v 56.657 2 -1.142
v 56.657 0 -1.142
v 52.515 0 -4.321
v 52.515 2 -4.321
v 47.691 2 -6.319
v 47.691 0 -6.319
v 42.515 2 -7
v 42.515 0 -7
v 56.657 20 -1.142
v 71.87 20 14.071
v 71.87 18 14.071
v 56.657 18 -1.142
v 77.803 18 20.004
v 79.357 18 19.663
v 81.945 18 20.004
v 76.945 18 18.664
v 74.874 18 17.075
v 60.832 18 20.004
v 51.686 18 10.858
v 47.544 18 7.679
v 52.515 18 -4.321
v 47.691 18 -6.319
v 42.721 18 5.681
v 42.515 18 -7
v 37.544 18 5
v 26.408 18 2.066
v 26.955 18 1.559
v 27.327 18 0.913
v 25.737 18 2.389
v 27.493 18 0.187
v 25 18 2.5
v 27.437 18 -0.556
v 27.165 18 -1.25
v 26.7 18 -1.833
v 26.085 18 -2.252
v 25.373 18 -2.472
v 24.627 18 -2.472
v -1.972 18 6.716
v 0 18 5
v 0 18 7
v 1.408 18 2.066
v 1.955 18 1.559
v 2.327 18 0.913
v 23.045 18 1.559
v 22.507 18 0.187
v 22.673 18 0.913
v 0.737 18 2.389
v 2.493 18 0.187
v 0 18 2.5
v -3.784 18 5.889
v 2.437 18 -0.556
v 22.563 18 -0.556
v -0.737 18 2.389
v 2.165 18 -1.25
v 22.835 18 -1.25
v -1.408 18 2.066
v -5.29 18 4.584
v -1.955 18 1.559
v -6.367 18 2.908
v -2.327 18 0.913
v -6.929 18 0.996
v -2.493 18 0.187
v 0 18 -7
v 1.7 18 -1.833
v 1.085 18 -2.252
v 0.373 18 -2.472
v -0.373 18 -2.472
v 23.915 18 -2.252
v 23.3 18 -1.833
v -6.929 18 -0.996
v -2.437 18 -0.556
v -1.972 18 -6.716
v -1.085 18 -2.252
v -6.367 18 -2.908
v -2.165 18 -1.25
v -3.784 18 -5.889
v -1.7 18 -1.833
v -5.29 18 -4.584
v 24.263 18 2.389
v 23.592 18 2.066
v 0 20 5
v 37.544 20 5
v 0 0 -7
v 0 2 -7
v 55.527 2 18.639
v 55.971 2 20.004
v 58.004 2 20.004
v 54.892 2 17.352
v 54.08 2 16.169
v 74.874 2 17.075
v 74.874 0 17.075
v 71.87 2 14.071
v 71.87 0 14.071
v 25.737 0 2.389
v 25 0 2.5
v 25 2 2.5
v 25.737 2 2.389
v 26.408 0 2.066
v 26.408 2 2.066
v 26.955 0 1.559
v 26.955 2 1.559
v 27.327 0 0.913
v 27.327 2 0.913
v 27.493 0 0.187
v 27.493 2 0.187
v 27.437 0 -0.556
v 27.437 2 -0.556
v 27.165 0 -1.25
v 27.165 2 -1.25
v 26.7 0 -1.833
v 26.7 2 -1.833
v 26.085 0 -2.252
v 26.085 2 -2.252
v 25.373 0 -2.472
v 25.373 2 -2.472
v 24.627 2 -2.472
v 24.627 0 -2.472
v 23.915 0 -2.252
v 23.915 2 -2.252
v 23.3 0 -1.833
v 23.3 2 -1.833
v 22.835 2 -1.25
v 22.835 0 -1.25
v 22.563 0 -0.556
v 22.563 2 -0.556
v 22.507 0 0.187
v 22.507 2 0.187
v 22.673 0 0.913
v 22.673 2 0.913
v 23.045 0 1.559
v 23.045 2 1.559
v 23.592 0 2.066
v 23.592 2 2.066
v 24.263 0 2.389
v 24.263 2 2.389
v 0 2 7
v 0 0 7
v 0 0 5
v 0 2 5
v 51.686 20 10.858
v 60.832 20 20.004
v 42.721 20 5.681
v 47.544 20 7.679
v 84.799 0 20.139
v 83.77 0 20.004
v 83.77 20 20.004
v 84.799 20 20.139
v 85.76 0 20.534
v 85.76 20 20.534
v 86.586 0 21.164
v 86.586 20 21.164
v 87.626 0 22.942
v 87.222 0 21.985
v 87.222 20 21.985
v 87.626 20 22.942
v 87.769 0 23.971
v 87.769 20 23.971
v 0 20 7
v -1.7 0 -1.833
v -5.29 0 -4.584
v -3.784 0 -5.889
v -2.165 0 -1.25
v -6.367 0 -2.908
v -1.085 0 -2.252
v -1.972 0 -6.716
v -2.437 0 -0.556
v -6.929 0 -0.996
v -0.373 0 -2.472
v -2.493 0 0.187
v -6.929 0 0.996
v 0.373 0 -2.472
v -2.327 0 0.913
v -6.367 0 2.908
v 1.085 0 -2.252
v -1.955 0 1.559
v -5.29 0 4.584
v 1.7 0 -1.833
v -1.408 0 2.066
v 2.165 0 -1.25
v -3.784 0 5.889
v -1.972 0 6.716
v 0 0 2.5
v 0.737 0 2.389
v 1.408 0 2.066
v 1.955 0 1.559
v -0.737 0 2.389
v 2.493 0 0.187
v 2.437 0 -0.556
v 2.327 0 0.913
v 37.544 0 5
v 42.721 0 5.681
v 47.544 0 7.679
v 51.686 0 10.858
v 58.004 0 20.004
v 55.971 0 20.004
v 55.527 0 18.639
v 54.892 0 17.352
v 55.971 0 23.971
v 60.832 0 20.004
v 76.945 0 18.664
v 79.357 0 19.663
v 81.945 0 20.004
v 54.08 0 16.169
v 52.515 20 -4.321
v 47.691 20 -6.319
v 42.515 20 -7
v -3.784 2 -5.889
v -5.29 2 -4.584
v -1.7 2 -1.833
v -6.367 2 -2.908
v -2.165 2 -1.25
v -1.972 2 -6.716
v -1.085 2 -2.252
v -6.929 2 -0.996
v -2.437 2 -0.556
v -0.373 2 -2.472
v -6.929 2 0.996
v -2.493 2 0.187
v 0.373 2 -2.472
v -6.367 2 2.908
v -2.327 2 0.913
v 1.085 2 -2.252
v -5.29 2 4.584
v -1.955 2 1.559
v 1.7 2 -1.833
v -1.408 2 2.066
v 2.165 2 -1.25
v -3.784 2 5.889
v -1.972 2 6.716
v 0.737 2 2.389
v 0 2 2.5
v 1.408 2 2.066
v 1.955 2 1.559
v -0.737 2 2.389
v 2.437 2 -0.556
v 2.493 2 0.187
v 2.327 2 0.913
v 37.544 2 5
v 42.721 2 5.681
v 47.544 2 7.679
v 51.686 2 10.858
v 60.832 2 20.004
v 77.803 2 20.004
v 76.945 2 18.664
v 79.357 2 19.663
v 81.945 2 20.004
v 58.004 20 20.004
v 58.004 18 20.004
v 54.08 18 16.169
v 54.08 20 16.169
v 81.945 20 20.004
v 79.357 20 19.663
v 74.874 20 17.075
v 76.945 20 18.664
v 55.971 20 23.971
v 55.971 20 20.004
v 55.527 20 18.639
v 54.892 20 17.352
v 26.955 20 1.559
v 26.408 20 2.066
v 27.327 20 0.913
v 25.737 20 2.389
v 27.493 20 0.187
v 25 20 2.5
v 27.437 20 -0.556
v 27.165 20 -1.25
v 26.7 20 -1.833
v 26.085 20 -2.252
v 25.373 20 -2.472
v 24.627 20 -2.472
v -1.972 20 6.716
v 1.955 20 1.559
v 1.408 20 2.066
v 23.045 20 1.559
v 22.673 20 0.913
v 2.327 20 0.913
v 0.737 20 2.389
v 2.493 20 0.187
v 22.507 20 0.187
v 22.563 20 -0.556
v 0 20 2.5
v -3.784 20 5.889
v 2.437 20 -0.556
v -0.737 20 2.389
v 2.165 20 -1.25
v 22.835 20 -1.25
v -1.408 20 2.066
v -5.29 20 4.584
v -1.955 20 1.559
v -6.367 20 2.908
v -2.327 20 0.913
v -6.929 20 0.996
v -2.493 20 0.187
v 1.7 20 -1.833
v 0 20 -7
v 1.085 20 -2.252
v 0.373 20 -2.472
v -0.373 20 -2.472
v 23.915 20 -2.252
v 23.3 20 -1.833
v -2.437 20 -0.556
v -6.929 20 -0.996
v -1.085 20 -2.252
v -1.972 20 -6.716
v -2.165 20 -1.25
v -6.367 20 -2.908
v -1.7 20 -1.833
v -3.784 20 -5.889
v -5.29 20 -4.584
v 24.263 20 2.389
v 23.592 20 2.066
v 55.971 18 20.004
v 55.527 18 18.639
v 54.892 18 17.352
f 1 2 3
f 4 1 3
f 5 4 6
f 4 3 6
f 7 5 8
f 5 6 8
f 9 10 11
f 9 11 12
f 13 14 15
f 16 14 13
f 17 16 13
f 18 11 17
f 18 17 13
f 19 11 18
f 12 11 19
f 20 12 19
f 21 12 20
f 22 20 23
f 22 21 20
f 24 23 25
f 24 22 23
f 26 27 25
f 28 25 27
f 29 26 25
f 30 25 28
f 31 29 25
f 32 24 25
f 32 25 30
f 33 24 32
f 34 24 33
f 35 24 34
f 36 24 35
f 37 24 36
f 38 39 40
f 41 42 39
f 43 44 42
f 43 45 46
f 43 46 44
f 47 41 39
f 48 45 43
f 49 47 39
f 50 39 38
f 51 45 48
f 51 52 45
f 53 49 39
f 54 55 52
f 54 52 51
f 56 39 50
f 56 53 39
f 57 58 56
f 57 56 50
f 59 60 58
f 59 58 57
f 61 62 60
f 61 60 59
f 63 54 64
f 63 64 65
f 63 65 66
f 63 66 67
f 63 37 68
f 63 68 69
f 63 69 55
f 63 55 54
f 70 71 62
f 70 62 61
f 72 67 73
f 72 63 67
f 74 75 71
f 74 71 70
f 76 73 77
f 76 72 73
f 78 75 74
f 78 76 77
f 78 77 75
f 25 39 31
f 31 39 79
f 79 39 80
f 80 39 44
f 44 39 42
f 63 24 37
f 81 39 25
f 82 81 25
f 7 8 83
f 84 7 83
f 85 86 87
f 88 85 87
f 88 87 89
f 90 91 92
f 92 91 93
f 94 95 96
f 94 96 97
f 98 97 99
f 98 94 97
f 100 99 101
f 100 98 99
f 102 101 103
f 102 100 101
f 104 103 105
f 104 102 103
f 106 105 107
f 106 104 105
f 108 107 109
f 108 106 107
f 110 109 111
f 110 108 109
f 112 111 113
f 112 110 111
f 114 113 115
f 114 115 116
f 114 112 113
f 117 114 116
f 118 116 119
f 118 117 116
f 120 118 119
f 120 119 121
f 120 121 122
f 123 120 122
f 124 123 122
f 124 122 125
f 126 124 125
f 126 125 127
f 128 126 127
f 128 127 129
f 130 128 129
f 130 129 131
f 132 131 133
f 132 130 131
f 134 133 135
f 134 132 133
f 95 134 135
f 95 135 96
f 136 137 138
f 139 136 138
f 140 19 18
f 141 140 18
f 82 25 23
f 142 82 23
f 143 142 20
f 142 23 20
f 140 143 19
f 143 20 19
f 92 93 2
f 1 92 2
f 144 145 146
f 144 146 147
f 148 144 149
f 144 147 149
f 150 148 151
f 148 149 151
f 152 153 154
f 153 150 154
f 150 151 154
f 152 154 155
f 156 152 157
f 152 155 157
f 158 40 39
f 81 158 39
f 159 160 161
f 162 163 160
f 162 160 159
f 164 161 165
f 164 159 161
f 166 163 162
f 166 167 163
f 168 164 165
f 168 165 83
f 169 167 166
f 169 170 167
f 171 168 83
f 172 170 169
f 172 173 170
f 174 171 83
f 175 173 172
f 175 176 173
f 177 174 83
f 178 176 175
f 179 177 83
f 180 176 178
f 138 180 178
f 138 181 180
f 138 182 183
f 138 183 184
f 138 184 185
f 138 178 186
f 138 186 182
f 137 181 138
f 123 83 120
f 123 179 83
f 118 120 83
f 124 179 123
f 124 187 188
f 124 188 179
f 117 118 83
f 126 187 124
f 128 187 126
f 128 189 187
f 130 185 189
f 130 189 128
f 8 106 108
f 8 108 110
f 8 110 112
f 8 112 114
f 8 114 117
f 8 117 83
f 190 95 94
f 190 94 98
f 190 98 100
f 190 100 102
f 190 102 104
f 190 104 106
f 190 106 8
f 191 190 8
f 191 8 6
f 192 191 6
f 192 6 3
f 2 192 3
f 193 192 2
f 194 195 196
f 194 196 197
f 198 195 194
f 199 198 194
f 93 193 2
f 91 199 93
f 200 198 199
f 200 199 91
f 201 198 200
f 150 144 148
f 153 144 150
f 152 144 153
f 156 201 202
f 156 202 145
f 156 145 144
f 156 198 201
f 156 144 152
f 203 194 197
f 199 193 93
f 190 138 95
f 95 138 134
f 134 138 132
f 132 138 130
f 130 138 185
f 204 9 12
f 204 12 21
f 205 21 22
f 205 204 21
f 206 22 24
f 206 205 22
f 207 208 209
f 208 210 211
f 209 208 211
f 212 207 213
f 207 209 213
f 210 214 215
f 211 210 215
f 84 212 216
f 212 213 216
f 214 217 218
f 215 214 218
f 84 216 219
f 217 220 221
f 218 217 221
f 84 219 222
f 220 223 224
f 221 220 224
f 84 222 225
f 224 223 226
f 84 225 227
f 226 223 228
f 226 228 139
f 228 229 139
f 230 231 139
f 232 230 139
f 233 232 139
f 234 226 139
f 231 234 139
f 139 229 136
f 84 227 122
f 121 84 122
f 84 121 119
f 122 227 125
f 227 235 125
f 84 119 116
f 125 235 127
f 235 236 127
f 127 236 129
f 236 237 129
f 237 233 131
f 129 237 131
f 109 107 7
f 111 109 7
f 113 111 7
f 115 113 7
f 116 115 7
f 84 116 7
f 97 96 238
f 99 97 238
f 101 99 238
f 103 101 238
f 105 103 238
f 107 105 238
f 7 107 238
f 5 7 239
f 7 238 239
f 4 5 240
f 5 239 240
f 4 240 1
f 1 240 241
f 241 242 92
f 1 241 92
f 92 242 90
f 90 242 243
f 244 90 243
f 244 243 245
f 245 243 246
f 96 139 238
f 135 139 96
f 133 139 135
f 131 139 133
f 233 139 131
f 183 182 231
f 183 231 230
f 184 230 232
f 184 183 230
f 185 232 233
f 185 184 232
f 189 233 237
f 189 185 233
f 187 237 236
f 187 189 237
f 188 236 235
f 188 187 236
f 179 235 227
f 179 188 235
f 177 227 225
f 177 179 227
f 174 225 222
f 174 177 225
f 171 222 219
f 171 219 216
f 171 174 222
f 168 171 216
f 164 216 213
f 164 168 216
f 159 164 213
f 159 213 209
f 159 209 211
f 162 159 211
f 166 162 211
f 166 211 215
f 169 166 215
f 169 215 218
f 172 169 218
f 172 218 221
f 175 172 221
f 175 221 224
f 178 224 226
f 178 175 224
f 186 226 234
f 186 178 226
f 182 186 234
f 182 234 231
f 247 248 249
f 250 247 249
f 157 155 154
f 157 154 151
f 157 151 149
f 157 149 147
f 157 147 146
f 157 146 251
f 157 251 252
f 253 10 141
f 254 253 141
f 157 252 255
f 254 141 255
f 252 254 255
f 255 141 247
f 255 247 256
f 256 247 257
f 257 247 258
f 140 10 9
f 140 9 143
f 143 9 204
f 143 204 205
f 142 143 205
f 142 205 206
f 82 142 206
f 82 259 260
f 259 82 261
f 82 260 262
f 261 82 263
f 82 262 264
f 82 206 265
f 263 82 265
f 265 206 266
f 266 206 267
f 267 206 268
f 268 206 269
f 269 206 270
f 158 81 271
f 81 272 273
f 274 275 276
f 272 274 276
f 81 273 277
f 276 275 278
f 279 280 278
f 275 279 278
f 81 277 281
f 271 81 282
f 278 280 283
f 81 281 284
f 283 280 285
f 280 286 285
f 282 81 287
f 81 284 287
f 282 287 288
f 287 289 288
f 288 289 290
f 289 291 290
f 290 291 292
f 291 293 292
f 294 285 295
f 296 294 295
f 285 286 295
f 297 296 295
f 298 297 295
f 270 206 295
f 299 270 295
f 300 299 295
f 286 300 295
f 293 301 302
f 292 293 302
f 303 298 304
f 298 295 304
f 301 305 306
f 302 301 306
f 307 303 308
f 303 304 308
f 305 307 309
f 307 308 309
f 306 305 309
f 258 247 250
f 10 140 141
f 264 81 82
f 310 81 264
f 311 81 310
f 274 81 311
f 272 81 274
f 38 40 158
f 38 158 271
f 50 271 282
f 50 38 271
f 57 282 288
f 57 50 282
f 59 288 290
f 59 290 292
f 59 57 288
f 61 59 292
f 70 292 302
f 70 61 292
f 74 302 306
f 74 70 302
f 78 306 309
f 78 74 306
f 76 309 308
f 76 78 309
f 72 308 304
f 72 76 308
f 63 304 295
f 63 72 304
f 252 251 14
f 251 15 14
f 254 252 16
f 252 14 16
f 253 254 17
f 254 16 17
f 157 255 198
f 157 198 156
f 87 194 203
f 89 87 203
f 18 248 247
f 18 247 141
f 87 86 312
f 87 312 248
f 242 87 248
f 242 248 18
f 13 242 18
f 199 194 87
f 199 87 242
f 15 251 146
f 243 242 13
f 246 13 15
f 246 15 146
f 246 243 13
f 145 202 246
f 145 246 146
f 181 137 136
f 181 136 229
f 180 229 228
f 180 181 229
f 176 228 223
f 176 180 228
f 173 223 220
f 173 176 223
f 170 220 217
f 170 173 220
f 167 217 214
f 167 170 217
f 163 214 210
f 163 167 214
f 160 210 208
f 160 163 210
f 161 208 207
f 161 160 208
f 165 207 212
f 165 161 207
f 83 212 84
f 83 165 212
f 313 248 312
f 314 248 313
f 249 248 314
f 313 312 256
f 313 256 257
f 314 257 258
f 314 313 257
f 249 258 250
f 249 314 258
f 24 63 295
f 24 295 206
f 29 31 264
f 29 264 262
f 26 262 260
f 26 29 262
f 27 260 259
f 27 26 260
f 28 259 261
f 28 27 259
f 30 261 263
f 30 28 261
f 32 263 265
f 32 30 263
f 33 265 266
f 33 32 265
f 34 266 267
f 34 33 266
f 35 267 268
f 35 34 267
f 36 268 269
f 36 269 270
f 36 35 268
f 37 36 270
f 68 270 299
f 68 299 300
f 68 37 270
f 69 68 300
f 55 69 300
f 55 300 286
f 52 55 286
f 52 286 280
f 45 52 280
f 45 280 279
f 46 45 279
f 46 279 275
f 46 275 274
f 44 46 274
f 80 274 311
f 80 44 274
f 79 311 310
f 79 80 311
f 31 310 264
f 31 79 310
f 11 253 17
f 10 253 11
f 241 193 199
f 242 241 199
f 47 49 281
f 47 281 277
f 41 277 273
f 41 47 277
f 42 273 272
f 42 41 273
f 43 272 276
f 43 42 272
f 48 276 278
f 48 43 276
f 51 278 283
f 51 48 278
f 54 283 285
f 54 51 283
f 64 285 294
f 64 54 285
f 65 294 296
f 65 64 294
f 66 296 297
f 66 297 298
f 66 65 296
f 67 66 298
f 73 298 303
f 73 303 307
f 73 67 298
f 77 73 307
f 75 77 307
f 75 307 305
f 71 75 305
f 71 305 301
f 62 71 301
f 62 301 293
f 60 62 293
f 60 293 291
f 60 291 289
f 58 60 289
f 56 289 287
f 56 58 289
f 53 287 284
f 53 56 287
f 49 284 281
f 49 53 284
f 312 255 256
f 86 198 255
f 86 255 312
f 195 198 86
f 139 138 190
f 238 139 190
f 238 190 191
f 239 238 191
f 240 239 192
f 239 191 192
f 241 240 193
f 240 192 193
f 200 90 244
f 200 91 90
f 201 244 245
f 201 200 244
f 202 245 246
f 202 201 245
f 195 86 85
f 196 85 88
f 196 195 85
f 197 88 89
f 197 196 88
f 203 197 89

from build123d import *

# Parameters (mm, degrees)
SKETCH1_R                = 2.5
BOSS_EXTRUDE1_DEPTH      = 2
BOSS_EXTRUDE2_DEPTH      = 2
BOSS_EXTRUDE3_DEPTH      = 18
BOSS_EXTRUDE3_DEPTH_BACK = 2
SKETCH4_W                = 31.798989874
SKETCH4_H                = 3.966560298
BOSS_EXTRUDE5_START      = -2
SKETCH6_R                = 2.5
BOSS_EXTRUDE5_DEPTH      = 2
FILLET1_R                = 10
FILLET2_R                = 10
FILLET4_R                = 4
CUT_EXTRUDE1_DEPTH       = 94.156093248


with BuildPart() as part:
    # Sketch1 → Boss-Extrude1 (new body)
    with BuildSketch(Plane(origin=(0, 0, 0), x_dir=(1, 0, 0), z_dir=(0, 1, 0))):
        with BuildLine():
            Line((0, 7), (25, 7))
            ThreePointArc((25, 7), (32, 0), (25, -7))
            Line((25, -7), (0, -7))
            ThreePointArc((0, -7), (-7, 0), (0, 7))
        make_face()
        with Locations(Location((0, 0, 0), (0, 0, 270))):
            Circle(SKETCH1_R, mode=Mode.SUBTRACT)
        with Locations(Location((25, 0, 0), (0, 0, 270))):
            Circle(SKETCH1_R, mode=Mode.SUBTRACT)
    extrude(amount=BOSS_EXTRUDE1_DEPTH)

    # Sketch3 → Boss-Extrude2 (add)
    with BuildSketch(Plane(origin=(0, 0, 0), x_dir=(-1, 0, 0), z_dir=(0, -1, 0))):
        with BuildLine():
            Line((-25, -7), (-36.715728753, -7))
            ThreePointArc((-36.715728753, -7), (-44.3693974, -8.52240935), (-50.857864376, -12.857864376))
            Line((-50.857864376, -12.857864376), (-61.970562748, -23.970562748))
            Line((-61.970562748, -23.970562748), (-81.769552622, -23.970562748))
            Line((-81.769552622, -23.970562748), (-71.870057685, -14.071067812))
            Line((-71.870057685, -14.071067812), (-56.656854249, 1.142135624))
            ThreePointArc((-56.656854249, 1.142135624), (-50.168387273, 5.47759065), (-42.514718626, 7))
            Line((-42.514718626, 7), (-25, 7))
            ThreePointArc((-25, 7), (-32, 0), (-25, -7))
        make_face()
    boss_extrude2 = extrude(amount=-BOSS_EXTRUDE2_DEPTH)

    # Sketch4 → Boss-Extrude3 (add, two sides: drawn at the far end of the back side and taken through both)
    with BuildSketch(Plane(origin=(0, 2, 0), x_dir=(1, 0, 0), z_dir=(0, 1, 0)).offset(-BOSS_EXTRUDE3_DEPTH_BACK)):
        with Locations((71.870057685, -21.987282599)):
            Rectangle(SKETCH4_W, SKETCH4_H)
    extrude(amount=BOSS_EXTRUDE3_DEPTH + BOSS_EXTRUDE3_DEPTH_BACK)

    # Mirror1: Boss-Extrude2 across plane
    add(boss_extrude2.mirror(Plane.ZX.offset(10)))

    # Sketch6 → Boss-Extrude5 (add)
    with BuildSketch(Plane(origin=(0, 20, 0), x_dir=(1, 0, 0), z_dir=(0, 1, 0)).offset(BOSS_EXTRUDE5_START)):
        with BuildLine():
            Line((25, -7), (0, -7))
            ThreePointArc((0, -7), (-7, 0), (0, 7))
            Line((0, 7), (25, 7))
            ThreePointArc((25, 7), (32, 0), (25, -7))
        make_face()
        with Locations(Location((0, 0, 0), (0, 0, 270))):
            Circle(SKETCH6_R, mode=Mode.SUBTRACT)
        with Locations(Location((25, 0, 0), (0, 0, 270))):
            Circle(SKETCH6_R, mode=Mode.SUBTRACT)
    extrude(amount=BOSS_EXTRUDE5_DEPTH)

    # Fillet1
    # the kernel refuses this fillet: 10 mm, written as the material it adds along each edge
    with BuildSketch(Plane(origin=(58.00400245, 0, 20.00400245), x_dir=(-1, 0, 0), z_dir=(0, 1, 0)), Plane(origin=(58.00400245, 18, 20.00400245), x_dir=(-1, 0, 0), z_dir=(0, 1, 0))) as fillet1_piece_1:
        with BuildLine():
            CenterArc((11.740850866, 2.401284758), FILLET1_R, 193.894123227, 31.105876773)
            Line((4.669783054, -4.669783054), (0, 0))
            Line((0, 0), (2.033439702, 0))
        make_face()
    extrude(amount=2)
    with BuildSketch(Plane(origin=(58.00400245, -16.510176322, 20.00400245), x_dir=(-1, 0, 0), z_dir=(0, 1, 0))) as fillet1_piece_2_section:
        with BuildLine():
            CenterArc((11.740850866, 2.401284758), FILLET1_R, 193.894123227, 31.105876773)
            Line((4.669783054, -4.669783054), (0, 0))
            Line((0, 0), (2.033439702, 0))
        make_face()
    fillet1_piece_2 = extrude(amount=35.020352644, mode=Mode.PRIVATE)
    fillet1_piece_2 = split(fillet1_piece_2, bisect_by=Plane(origin=(54.988670777, 18, 17.479262968), z_dir=(0, 1, 0)), keep=Keep.TOP, mode=Mode.PRIVATE)
    add(fillet1_piece_2)
    with BuildSketch(Plane(origin=(58.00400245, 1.489823678, 20.00400245), x_dir=(-1, 0, 0), z_dir=(0, 1, 0))) as fillet1_piece_3_section:
        with BuildLine():
            CenterArc((11.740850866, 2.401284758), FILLET1_R, 193.894123227, 31.105876773)
            Line((4.669783054, -4.669783054), (0, 0))
            Line((0, 0), (2.033439702, 0))
        make_face()
    fillet1_piece_3 = extrude(amount=35.020352644, mode=Mode.PRIVATE)
    fillet1_piece_3 = split(fillet1_piece_3, bisect_by=Plane(origin=(54.988670777, 2, 17.479262968), z_dir=(0, -1, 0)), keep=Keep.TOP, mode=Mode.PRIVATE)
    add(fillet1_piece_3)

    # Fillet2
    fillet2_edges = [part.edges().sort_by_distance(p)[0] for p in [
        (77.802992324, 1, 20.00400245),
        (77.802992324, 19, 20.00400245),
    ]]
    fillet(fillet2_edges, radius=FILLET2_R)

    # Fillet4
    # the kernel refuses this fillet: 4 mm, written as the material it takes off along each edge
    with BuildSketch(Plane(origin=(87.769552622, 30, 20.00400245), x_dir=(0, 0, 1), z_dir=(0, -1, 0))) as fillet4_piece_1:
        with BuildLine():
            CenterArc((FILLET4_R, FILLET4_R), FILLET4_R, 180, 90)
            Line((0, FILLET4_R), (0, 0))
            Line((0, 0), (FILLET4_R, 0))
        make_face()
    extrude(amount=40, mode=Mode.SUBTRACT)

    # Sketch8 → Cut-Extrude1 (cut, through all)
    with BuildSketch(Plane.XZ):
        with BuildLine():
            Line((0, 5), (25, 5))
            Line((25, 5), (37.544155877, 5))
            ThreePointArc((37.544155877, 5), (45.197824525, 6.52240935), (51.686291501, 10.857864376))
            Line((51.686291501, 10.857864376), (60.832429575, 20.00400245))
            Line((60.832429575, 20.00400245), (58.00400245, 20.00400245))
            Line((58.00400245, 20.00400245), (50.528510621, 12.697308088))
            ThreePointArc((50.528510621, 12.697308088), (44.096826604, 8.479014089), (36.548775141, 7))
            Line((36.548775141, 7), (0, 7))
            Line((0, 7), (0, 5))
        make_face()
    extrude(amount=-CUT_EXTRUDE1_DEPTH, mode=Mode.SUBTRACT)


solid = part.part
